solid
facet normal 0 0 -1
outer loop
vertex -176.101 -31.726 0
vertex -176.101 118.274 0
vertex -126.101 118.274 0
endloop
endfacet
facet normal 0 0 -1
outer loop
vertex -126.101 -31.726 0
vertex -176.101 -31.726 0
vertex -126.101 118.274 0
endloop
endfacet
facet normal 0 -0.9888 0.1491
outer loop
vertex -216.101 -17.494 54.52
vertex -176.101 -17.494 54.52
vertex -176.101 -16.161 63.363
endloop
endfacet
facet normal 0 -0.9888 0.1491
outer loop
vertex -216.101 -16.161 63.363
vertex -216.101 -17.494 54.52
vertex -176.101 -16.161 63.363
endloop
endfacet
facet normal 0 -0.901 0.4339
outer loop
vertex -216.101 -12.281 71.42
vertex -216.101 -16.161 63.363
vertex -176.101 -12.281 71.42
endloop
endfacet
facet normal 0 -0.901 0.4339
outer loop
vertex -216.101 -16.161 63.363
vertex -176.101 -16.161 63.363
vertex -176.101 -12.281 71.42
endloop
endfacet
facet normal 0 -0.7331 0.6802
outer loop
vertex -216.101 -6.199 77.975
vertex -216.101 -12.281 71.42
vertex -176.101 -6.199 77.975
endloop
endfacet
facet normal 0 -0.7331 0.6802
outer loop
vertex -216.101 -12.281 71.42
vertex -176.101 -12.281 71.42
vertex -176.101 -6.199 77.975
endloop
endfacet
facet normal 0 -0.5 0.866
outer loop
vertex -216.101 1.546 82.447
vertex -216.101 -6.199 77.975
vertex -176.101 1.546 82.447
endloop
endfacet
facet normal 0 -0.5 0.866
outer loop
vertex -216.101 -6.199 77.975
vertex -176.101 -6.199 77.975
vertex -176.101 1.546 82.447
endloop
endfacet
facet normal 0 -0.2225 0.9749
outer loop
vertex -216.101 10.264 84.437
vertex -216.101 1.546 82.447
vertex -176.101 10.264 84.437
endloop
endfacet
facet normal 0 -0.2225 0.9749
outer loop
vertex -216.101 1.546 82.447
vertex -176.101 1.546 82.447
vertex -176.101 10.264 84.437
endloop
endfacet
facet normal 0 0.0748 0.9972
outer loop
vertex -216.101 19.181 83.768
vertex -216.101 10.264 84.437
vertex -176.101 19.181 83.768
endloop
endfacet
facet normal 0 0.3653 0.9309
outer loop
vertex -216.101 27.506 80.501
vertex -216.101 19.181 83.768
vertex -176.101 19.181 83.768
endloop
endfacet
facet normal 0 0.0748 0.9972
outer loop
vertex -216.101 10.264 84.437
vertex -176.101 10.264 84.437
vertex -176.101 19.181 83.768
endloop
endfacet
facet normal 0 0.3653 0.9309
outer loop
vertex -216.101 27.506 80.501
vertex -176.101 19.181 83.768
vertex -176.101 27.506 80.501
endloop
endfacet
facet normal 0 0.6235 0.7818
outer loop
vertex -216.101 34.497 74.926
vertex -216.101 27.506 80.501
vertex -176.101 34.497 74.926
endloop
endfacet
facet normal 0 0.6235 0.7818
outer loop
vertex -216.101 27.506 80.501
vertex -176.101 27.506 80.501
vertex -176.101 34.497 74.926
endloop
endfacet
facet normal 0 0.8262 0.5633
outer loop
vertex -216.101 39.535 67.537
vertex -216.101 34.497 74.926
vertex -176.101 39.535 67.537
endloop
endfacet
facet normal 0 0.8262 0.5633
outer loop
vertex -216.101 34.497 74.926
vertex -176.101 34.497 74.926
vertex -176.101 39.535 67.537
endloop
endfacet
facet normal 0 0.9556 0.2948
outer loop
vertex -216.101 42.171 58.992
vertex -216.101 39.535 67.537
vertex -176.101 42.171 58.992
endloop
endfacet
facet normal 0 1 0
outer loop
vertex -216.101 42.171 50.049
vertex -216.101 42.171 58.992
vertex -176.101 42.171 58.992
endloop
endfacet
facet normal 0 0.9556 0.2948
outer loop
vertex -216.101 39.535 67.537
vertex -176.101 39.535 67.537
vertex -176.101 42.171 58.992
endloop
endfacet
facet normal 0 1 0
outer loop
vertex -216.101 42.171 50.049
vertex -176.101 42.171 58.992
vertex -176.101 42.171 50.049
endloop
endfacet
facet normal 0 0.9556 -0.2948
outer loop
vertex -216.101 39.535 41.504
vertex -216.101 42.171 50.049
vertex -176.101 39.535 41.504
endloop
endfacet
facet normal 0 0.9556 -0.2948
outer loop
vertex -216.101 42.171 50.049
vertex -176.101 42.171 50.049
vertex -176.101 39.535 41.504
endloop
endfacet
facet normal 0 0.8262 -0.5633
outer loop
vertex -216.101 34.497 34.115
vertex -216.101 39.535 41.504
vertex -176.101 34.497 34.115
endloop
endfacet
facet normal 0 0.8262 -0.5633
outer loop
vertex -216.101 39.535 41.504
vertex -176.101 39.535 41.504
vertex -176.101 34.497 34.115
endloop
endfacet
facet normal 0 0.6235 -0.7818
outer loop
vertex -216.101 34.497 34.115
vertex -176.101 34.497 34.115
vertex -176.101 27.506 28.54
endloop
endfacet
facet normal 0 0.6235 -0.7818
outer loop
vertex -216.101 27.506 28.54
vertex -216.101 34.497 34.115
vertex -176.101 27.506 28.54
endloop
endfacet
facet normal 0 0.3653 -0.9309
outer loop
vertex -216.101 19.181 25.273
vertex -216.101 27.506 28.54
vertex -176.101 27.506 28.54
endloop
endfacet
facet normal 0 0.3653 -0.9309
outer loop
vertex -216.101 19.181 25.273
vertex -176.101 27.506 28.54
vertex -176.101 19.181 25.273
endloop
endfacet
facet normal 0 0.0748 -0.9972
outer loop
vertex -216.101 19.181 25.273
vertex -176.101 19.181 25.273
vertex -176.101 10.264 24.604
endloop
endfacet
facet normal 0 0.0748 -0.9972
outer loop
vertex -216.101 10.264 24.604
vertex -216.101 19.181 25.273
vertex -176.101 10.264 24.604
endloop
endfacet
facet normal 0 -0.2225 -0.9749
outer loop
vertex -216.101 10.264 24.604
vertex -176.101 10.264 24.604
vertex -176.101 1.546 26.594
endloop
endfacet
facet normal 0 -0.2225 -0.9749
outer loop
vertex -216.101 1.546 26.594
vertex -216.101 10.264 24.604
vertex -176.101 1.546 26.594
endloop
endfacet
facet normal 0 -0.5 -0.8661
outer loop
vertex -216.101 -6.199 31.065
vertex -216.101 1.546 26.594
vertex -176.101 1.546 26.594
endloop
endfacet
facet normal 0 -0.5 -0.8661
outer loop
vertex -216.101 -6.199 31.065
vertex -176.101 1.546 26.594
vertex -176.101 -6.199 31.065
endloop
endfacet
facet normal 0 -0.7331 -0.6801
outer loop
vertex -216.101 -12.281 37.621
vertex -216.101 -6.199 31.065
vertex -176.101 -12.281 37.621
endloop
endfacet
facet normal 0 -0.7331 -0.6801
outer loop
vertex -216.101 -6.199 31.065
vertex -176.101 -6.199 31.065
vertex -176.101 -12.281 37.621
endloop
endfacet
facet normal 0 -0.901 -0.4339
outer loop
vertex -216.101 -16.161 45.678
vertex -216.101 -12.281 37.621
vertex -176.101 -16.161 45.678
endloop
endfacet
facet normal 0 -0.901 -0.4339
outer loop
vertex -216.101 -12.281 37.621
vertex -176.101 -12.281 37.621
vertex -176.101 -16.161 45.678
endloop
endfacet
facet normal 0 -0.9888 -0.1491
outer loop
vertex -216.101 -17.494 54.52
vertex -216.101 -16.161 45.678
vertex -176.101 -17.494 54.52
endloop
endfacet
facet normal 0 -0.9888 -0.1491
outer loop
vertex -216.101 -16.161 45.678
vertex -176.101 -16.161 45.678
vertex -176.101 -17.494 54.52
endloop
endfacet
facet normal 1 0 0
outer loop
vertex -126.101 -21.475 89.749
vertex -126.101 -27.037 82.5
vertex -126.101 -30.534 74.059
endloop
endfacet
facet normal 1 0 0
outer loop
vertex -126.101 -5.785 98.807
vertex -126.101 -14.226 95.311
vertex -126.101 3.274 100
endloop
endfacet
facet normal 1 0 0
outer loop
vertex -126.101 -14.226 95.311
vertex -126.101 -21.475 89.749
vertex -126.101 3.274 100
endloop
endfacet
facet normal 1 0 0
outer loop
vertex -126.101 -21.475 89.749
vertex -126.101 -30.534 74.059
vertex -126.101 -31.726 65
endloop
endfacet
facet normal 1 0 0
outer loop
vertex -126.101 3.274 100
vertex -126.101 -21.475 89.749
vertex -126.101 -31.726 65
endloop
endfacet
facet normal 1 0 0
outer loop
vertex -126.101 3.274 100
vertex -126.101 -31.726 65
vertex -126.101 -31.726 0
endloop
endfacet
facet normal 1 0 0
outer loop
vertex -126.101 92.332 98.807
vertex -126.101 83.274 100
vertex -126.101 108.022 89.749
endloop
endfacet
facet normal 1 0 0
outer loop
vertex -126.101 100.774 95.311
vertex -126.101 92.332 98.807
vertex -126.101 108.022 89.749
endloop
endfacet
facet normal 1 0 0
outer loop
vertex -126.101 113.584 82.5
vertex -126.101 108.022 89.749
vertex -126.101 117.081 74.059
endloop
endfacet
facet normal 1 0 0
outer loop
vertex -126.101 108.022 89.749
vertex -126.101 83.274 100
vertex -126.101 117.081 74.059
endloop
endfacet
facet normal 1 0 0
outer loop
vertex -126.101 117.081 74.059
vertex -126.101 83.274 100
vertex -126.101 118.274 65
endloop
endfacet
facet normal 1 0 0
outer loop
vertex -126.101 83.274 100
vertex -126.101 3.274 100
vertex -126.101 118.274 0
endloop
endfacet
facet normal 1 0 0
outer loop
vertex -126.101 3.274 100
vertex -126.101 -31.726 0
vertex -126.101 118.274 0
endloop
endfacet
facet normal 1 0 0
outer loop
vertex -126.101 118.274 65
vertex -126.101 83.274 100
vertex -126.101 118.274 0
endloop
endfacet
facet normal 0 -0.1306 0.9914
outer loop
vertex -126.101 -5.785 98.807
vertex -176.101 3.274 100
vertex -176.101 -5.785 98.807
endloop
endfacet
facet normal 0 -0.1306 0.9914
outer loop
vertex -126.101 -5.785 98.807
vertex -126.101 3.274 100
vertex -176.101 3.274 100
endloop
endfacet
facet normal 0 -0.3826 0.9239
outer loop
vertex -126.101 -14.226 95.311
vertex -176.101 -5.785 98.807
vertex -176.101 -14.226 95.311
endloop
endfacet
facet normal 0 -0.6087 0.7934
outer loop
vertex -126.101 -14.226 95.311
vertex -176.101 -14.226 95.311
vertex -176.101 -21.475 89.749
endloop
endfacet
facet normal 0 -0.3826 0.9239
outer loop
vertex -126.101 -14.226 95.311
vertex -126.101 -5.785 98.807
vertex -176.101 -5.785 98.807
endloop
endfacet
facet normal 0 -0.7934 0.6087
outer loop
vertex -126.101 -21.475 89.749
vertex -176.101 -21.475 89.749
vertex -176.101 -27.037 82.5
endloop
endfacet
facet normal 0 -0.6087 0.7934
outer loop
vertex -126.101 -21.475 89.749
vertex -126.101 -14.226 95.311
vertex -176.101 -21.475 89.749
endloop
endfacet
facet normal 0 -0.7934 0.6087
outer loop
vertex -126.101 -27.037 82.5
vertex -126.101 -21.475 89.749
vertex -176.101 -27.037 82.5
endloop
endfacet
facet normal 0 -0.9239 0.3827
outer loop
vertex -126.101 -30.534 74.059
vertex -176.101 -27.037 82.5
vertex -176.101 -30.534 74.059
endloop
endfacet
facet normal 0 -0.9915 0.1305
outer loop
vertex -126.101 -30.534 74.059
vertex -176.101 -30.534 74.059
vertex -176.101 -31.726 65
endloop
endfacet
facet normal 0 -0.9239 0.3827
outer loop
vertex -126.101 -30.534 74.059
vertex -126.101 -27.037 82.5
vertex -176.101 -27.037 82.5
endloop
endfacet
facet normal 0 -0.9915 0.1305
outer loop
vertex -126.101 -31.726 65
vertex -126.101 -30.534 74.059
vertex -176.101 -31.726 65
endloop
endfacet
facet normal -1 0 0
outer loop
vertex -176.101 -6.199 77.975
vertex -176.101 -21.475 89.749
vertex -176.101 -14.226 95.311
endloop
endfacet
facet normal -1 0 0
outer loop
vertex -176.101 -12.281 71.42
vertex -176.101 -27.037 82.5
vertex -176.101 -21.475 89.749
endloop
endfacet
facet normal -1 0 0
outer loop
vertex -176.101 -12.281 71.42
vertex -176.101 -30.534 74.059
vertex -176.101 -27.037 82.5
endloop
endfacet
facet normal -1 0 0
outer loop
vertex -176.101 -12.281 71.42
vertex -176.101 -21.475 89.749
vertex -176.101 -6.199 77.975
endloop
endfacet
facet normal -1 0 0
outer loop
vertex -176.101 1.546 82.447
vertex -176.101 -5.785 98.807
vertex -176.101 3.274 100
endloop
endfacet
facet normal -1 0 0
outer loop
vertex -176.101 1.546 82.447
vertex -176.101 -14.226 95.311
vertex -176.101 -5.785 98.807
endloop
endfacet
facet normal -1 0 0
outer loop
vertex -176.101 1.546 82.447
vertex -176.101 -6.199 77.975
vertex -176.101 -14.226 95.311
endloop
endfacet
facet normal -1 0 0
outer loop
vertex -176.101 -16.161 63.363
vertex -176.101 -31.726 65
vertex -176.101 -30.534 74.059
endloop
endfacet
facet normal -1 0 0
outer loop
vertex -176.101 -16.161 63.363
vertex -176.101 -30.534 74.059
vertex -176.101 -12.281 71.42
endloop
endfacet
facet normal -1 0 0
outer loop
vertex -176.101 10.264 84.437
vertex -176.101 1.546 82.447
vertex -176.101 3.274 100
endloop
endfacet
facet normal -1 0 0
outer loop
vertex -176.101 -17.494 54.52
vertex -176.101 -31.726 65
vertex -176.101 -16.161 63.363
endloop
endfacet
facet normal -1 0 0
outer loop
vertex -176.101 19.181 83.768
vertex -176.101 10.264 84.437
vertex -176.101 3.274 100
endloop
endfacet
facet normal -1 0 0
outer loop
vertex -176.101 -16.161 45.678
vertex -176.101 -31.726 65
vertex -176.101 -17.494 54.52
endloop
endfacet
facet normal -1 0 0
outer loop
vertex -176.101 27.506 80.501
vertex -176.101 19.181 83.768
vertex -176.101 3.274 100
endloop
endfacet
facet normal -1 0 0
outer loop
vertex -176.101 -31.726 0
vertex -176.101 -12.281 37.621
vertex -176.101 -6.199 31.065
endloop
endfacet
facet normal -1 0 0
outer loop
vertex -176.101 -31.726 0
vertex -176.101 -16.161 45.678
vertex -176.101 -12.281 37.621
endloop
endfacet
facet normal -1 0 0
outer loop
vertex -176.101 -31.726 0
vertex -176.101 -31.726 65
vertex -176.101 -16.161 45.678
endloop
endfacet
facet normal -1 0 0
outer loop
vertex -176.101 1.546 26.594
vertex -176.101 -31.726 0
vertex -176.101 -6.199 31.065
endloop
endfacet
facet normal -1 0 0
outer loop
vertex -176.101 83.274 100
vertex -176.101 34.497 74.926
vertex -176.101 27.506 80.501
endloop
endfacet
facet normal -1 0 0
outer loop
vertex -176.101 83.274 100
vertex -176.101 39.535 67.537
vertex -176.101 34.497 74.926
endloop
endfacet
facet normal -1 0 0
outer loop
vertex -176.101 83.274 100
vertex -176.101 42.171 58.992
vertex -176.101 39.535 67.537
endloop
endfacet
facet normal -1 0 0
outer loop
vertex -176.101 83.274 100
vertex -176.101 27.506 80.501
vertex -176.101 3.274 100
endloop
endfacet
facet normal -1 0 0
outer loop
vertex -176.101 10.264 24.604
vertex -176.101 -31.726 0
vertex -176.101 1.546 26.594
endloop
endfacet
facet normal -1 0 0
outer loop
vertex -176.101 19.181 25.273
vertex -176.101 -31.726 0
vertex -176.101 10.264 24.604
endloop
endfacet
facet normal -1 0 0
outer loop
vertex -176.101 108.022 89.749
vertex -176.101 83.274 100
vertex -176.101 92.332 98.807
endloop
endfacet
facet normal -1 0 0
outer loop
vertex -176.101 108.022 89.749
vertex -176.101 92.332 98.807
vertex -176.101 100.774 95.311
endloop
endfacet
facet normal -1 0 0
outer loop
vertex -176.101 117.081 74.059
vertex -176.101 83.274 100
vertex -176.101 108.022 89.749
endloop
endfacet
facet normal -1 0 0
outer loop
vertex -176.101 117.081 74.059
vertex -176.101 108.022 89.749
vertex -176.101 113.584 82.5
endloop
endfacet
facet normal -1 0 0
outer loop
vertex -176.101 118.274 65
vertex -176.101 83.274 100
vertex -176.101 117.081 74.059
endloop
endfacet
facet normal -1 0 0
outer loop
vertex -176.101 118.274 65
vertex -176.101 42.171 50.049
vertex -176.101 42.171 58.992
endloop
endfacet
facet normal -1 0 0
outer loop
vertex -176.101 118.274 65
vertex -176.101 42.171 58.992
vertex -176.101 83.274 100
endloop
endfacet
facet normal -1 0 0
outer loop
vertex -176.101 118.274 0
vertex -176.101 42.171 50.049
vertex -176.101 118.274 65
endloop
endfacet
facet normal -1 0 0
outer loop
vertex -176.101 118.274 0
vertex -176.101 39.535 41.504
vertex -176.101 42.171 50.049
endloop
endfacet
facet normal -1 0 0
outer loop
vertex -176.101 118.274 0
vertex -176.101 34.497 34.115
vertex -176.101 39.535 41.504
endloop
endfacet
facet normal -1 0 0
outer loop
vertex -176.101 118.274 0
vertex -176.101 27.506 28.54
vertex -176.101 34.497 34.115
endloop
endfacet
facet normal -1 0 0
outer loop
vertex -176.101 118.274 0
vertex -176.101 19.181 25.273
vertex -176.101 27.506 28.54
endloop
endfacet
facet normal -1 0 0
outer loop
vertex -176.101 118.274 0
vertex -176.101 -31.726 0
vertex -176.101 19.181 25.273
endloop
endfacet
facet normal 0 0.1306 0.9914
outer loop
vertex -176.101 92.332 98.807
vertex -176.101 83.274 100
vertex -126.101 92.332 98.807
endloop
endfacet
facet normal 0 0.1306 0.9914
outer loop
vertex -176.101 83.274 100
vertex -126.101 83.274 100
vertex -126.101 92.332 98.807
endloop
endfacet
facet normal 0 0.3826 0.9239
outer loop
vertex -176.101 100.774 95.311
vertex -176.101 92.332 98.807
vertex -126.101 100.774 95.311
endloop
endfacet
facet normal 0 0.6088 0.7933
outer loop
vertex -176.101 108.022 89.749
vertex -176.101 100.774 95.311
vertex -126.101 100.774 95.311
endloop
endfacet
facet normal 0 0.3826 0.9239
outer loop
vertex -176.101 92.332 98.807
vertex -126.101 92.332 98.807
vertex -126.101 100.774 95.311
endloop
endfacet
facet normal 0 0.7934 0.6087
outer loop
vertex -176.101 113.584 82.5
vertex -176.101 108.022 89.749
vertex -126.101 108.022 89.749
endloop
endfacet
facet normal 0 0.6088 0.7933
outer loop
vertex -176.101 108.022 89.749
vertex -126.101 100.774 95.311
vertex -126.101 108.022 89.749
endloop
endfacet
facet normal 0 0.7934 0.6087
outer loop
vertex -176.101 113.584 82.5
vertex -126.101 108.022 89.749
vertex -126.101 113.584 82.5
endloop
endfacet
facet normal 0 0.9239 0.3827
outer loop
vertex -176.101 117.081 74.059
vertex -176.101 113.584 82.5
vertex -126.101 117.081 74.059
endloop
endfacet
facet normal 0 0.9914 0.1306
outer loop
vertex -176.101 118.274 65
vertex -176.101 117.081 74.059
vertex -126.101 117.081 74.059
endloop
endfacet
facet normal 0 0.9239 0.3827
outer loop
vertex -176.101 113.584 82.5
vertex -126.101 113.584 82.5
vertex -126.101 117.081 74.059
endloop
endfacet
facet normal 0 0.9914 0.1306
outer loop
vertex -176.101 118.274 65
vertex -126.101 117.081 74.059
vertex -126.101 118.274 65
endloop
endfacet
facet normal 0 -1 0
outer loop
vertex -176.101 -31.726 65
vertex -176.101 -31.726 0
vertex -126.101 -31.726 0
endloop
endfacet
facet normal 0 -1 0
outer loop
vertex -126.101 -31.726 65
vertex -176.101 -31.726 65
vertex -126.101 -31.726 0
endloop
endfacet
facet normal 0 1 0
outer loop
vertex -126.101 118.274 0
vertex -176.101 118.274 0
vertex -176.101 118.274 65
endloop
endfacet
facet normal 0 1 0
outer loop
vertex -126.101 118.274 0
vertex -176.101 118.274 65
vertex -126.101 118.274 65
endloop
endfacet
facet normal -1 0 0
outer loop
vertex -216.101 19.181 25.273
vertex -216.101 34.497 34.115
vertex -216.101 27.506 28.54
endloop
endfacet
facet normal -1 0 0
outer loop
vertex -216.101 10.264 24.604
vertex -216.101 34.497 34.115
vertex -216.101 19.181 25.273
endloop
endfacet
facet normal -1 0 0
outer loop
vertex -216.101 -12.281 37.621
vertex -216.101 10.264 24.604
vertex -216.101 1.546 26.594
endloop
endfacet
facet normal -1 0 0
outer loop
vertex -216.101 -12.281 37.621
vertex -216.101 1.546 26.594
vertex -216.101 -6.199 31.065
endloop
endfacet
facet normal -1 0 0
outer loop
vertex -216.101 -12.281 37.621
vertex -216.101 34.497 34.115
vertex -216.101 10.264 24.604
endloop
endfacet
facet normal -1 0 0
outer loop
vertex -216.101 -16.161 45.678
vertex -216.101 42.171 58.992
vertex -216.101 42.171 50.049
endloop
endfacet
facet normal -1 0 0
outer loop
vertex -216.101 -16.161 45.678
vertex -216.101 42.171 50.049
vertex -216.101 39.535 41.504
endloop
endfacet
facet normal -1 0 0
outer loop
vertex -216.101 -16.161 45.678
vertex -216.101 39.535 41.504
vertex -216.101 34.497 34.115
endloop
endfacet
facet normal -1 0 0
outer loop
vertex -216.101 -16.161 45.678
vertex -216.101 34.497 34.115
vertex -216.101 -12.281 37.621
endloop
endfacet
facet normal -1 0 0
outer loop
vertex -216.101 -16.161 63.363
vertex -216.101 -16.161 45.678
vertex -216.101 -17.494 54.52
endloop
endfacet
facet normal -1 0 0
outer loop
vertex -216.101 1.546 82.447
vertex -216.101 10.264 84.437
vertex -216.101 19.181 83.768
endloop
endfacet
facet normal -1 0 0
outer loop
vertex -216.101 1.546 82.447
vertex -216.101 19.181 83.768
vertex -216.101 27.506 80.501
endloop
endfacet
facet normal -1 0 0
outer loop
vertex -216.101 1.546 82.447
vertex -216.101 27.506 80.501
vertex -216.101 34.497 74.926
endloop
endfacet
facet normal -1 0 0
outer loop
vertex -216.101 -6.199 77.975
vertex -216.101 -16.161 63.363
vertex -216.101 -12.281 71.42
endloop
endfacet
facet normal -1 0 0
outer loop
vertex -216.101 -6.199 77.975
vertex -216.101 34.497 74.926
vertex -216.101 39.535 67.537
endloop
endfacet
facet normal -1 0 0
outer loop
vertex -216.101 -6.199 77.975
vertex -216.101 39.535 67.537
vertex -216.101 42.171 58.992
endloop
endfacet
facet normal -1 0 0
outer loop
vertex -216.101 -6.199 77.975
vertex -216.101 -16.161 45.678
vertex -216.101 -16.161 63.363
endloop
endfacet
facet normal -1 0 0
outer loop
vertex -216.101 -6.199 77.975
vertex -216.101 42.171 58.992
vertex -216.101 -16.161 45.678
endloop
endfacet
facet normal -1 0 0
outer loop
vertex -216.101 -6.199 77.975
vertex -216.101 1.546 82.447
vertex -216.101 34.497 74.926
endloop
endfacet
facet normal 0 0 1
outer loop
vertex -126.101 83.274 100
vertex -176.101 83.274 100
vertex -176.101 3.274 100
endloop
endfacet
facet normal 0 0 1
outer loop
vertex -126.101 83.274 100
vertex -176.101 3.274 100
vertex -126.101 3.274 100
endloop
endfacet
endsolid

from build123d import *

# Parameters (mm, degrees)
F0_W     = 50
F0_H     = 150
F1_DEPTH = 100
F2_R     = 30
F3_DEPTH = 40
F4_R     = 35
F5_R     = 35


with BuildPart() as f1:
    # F0 (on Top) → F1 (new body)
    with BuildSketch(Plane.XY):
        with Locations((-151.100701, 43.27358)):
            Rectangle(F0_W, F0_H)
    extrude(amount=F1_DEPTH)

    # F2 (on face) → F3 (join)
    with BuildSketch(Plane(origin=(-176.100701, 0, 0), x_dir=(0, -1, 0), z_dir=(-1, 0, 0))):
        with Locations((-12.505785, 54.520387)):
            Circle(F2_R)
    extrude(amount=F3_DEPTH)

    # F4
    f4_edges = [f1.edges().sort_by_distance(p)[0] for p in [
        (-151.100701, 118.27358, 100),
    ]]
    fillet(f4_edges, radius=F4_R)

    # F5
    f5_edges = [f1.edges().sort_by_distance(p)[0] for p in [
        (-151.100701, -31.72642, 100),
    ]]
    fillet(f5_edges, radius=F5_R)


solid = f1.part
